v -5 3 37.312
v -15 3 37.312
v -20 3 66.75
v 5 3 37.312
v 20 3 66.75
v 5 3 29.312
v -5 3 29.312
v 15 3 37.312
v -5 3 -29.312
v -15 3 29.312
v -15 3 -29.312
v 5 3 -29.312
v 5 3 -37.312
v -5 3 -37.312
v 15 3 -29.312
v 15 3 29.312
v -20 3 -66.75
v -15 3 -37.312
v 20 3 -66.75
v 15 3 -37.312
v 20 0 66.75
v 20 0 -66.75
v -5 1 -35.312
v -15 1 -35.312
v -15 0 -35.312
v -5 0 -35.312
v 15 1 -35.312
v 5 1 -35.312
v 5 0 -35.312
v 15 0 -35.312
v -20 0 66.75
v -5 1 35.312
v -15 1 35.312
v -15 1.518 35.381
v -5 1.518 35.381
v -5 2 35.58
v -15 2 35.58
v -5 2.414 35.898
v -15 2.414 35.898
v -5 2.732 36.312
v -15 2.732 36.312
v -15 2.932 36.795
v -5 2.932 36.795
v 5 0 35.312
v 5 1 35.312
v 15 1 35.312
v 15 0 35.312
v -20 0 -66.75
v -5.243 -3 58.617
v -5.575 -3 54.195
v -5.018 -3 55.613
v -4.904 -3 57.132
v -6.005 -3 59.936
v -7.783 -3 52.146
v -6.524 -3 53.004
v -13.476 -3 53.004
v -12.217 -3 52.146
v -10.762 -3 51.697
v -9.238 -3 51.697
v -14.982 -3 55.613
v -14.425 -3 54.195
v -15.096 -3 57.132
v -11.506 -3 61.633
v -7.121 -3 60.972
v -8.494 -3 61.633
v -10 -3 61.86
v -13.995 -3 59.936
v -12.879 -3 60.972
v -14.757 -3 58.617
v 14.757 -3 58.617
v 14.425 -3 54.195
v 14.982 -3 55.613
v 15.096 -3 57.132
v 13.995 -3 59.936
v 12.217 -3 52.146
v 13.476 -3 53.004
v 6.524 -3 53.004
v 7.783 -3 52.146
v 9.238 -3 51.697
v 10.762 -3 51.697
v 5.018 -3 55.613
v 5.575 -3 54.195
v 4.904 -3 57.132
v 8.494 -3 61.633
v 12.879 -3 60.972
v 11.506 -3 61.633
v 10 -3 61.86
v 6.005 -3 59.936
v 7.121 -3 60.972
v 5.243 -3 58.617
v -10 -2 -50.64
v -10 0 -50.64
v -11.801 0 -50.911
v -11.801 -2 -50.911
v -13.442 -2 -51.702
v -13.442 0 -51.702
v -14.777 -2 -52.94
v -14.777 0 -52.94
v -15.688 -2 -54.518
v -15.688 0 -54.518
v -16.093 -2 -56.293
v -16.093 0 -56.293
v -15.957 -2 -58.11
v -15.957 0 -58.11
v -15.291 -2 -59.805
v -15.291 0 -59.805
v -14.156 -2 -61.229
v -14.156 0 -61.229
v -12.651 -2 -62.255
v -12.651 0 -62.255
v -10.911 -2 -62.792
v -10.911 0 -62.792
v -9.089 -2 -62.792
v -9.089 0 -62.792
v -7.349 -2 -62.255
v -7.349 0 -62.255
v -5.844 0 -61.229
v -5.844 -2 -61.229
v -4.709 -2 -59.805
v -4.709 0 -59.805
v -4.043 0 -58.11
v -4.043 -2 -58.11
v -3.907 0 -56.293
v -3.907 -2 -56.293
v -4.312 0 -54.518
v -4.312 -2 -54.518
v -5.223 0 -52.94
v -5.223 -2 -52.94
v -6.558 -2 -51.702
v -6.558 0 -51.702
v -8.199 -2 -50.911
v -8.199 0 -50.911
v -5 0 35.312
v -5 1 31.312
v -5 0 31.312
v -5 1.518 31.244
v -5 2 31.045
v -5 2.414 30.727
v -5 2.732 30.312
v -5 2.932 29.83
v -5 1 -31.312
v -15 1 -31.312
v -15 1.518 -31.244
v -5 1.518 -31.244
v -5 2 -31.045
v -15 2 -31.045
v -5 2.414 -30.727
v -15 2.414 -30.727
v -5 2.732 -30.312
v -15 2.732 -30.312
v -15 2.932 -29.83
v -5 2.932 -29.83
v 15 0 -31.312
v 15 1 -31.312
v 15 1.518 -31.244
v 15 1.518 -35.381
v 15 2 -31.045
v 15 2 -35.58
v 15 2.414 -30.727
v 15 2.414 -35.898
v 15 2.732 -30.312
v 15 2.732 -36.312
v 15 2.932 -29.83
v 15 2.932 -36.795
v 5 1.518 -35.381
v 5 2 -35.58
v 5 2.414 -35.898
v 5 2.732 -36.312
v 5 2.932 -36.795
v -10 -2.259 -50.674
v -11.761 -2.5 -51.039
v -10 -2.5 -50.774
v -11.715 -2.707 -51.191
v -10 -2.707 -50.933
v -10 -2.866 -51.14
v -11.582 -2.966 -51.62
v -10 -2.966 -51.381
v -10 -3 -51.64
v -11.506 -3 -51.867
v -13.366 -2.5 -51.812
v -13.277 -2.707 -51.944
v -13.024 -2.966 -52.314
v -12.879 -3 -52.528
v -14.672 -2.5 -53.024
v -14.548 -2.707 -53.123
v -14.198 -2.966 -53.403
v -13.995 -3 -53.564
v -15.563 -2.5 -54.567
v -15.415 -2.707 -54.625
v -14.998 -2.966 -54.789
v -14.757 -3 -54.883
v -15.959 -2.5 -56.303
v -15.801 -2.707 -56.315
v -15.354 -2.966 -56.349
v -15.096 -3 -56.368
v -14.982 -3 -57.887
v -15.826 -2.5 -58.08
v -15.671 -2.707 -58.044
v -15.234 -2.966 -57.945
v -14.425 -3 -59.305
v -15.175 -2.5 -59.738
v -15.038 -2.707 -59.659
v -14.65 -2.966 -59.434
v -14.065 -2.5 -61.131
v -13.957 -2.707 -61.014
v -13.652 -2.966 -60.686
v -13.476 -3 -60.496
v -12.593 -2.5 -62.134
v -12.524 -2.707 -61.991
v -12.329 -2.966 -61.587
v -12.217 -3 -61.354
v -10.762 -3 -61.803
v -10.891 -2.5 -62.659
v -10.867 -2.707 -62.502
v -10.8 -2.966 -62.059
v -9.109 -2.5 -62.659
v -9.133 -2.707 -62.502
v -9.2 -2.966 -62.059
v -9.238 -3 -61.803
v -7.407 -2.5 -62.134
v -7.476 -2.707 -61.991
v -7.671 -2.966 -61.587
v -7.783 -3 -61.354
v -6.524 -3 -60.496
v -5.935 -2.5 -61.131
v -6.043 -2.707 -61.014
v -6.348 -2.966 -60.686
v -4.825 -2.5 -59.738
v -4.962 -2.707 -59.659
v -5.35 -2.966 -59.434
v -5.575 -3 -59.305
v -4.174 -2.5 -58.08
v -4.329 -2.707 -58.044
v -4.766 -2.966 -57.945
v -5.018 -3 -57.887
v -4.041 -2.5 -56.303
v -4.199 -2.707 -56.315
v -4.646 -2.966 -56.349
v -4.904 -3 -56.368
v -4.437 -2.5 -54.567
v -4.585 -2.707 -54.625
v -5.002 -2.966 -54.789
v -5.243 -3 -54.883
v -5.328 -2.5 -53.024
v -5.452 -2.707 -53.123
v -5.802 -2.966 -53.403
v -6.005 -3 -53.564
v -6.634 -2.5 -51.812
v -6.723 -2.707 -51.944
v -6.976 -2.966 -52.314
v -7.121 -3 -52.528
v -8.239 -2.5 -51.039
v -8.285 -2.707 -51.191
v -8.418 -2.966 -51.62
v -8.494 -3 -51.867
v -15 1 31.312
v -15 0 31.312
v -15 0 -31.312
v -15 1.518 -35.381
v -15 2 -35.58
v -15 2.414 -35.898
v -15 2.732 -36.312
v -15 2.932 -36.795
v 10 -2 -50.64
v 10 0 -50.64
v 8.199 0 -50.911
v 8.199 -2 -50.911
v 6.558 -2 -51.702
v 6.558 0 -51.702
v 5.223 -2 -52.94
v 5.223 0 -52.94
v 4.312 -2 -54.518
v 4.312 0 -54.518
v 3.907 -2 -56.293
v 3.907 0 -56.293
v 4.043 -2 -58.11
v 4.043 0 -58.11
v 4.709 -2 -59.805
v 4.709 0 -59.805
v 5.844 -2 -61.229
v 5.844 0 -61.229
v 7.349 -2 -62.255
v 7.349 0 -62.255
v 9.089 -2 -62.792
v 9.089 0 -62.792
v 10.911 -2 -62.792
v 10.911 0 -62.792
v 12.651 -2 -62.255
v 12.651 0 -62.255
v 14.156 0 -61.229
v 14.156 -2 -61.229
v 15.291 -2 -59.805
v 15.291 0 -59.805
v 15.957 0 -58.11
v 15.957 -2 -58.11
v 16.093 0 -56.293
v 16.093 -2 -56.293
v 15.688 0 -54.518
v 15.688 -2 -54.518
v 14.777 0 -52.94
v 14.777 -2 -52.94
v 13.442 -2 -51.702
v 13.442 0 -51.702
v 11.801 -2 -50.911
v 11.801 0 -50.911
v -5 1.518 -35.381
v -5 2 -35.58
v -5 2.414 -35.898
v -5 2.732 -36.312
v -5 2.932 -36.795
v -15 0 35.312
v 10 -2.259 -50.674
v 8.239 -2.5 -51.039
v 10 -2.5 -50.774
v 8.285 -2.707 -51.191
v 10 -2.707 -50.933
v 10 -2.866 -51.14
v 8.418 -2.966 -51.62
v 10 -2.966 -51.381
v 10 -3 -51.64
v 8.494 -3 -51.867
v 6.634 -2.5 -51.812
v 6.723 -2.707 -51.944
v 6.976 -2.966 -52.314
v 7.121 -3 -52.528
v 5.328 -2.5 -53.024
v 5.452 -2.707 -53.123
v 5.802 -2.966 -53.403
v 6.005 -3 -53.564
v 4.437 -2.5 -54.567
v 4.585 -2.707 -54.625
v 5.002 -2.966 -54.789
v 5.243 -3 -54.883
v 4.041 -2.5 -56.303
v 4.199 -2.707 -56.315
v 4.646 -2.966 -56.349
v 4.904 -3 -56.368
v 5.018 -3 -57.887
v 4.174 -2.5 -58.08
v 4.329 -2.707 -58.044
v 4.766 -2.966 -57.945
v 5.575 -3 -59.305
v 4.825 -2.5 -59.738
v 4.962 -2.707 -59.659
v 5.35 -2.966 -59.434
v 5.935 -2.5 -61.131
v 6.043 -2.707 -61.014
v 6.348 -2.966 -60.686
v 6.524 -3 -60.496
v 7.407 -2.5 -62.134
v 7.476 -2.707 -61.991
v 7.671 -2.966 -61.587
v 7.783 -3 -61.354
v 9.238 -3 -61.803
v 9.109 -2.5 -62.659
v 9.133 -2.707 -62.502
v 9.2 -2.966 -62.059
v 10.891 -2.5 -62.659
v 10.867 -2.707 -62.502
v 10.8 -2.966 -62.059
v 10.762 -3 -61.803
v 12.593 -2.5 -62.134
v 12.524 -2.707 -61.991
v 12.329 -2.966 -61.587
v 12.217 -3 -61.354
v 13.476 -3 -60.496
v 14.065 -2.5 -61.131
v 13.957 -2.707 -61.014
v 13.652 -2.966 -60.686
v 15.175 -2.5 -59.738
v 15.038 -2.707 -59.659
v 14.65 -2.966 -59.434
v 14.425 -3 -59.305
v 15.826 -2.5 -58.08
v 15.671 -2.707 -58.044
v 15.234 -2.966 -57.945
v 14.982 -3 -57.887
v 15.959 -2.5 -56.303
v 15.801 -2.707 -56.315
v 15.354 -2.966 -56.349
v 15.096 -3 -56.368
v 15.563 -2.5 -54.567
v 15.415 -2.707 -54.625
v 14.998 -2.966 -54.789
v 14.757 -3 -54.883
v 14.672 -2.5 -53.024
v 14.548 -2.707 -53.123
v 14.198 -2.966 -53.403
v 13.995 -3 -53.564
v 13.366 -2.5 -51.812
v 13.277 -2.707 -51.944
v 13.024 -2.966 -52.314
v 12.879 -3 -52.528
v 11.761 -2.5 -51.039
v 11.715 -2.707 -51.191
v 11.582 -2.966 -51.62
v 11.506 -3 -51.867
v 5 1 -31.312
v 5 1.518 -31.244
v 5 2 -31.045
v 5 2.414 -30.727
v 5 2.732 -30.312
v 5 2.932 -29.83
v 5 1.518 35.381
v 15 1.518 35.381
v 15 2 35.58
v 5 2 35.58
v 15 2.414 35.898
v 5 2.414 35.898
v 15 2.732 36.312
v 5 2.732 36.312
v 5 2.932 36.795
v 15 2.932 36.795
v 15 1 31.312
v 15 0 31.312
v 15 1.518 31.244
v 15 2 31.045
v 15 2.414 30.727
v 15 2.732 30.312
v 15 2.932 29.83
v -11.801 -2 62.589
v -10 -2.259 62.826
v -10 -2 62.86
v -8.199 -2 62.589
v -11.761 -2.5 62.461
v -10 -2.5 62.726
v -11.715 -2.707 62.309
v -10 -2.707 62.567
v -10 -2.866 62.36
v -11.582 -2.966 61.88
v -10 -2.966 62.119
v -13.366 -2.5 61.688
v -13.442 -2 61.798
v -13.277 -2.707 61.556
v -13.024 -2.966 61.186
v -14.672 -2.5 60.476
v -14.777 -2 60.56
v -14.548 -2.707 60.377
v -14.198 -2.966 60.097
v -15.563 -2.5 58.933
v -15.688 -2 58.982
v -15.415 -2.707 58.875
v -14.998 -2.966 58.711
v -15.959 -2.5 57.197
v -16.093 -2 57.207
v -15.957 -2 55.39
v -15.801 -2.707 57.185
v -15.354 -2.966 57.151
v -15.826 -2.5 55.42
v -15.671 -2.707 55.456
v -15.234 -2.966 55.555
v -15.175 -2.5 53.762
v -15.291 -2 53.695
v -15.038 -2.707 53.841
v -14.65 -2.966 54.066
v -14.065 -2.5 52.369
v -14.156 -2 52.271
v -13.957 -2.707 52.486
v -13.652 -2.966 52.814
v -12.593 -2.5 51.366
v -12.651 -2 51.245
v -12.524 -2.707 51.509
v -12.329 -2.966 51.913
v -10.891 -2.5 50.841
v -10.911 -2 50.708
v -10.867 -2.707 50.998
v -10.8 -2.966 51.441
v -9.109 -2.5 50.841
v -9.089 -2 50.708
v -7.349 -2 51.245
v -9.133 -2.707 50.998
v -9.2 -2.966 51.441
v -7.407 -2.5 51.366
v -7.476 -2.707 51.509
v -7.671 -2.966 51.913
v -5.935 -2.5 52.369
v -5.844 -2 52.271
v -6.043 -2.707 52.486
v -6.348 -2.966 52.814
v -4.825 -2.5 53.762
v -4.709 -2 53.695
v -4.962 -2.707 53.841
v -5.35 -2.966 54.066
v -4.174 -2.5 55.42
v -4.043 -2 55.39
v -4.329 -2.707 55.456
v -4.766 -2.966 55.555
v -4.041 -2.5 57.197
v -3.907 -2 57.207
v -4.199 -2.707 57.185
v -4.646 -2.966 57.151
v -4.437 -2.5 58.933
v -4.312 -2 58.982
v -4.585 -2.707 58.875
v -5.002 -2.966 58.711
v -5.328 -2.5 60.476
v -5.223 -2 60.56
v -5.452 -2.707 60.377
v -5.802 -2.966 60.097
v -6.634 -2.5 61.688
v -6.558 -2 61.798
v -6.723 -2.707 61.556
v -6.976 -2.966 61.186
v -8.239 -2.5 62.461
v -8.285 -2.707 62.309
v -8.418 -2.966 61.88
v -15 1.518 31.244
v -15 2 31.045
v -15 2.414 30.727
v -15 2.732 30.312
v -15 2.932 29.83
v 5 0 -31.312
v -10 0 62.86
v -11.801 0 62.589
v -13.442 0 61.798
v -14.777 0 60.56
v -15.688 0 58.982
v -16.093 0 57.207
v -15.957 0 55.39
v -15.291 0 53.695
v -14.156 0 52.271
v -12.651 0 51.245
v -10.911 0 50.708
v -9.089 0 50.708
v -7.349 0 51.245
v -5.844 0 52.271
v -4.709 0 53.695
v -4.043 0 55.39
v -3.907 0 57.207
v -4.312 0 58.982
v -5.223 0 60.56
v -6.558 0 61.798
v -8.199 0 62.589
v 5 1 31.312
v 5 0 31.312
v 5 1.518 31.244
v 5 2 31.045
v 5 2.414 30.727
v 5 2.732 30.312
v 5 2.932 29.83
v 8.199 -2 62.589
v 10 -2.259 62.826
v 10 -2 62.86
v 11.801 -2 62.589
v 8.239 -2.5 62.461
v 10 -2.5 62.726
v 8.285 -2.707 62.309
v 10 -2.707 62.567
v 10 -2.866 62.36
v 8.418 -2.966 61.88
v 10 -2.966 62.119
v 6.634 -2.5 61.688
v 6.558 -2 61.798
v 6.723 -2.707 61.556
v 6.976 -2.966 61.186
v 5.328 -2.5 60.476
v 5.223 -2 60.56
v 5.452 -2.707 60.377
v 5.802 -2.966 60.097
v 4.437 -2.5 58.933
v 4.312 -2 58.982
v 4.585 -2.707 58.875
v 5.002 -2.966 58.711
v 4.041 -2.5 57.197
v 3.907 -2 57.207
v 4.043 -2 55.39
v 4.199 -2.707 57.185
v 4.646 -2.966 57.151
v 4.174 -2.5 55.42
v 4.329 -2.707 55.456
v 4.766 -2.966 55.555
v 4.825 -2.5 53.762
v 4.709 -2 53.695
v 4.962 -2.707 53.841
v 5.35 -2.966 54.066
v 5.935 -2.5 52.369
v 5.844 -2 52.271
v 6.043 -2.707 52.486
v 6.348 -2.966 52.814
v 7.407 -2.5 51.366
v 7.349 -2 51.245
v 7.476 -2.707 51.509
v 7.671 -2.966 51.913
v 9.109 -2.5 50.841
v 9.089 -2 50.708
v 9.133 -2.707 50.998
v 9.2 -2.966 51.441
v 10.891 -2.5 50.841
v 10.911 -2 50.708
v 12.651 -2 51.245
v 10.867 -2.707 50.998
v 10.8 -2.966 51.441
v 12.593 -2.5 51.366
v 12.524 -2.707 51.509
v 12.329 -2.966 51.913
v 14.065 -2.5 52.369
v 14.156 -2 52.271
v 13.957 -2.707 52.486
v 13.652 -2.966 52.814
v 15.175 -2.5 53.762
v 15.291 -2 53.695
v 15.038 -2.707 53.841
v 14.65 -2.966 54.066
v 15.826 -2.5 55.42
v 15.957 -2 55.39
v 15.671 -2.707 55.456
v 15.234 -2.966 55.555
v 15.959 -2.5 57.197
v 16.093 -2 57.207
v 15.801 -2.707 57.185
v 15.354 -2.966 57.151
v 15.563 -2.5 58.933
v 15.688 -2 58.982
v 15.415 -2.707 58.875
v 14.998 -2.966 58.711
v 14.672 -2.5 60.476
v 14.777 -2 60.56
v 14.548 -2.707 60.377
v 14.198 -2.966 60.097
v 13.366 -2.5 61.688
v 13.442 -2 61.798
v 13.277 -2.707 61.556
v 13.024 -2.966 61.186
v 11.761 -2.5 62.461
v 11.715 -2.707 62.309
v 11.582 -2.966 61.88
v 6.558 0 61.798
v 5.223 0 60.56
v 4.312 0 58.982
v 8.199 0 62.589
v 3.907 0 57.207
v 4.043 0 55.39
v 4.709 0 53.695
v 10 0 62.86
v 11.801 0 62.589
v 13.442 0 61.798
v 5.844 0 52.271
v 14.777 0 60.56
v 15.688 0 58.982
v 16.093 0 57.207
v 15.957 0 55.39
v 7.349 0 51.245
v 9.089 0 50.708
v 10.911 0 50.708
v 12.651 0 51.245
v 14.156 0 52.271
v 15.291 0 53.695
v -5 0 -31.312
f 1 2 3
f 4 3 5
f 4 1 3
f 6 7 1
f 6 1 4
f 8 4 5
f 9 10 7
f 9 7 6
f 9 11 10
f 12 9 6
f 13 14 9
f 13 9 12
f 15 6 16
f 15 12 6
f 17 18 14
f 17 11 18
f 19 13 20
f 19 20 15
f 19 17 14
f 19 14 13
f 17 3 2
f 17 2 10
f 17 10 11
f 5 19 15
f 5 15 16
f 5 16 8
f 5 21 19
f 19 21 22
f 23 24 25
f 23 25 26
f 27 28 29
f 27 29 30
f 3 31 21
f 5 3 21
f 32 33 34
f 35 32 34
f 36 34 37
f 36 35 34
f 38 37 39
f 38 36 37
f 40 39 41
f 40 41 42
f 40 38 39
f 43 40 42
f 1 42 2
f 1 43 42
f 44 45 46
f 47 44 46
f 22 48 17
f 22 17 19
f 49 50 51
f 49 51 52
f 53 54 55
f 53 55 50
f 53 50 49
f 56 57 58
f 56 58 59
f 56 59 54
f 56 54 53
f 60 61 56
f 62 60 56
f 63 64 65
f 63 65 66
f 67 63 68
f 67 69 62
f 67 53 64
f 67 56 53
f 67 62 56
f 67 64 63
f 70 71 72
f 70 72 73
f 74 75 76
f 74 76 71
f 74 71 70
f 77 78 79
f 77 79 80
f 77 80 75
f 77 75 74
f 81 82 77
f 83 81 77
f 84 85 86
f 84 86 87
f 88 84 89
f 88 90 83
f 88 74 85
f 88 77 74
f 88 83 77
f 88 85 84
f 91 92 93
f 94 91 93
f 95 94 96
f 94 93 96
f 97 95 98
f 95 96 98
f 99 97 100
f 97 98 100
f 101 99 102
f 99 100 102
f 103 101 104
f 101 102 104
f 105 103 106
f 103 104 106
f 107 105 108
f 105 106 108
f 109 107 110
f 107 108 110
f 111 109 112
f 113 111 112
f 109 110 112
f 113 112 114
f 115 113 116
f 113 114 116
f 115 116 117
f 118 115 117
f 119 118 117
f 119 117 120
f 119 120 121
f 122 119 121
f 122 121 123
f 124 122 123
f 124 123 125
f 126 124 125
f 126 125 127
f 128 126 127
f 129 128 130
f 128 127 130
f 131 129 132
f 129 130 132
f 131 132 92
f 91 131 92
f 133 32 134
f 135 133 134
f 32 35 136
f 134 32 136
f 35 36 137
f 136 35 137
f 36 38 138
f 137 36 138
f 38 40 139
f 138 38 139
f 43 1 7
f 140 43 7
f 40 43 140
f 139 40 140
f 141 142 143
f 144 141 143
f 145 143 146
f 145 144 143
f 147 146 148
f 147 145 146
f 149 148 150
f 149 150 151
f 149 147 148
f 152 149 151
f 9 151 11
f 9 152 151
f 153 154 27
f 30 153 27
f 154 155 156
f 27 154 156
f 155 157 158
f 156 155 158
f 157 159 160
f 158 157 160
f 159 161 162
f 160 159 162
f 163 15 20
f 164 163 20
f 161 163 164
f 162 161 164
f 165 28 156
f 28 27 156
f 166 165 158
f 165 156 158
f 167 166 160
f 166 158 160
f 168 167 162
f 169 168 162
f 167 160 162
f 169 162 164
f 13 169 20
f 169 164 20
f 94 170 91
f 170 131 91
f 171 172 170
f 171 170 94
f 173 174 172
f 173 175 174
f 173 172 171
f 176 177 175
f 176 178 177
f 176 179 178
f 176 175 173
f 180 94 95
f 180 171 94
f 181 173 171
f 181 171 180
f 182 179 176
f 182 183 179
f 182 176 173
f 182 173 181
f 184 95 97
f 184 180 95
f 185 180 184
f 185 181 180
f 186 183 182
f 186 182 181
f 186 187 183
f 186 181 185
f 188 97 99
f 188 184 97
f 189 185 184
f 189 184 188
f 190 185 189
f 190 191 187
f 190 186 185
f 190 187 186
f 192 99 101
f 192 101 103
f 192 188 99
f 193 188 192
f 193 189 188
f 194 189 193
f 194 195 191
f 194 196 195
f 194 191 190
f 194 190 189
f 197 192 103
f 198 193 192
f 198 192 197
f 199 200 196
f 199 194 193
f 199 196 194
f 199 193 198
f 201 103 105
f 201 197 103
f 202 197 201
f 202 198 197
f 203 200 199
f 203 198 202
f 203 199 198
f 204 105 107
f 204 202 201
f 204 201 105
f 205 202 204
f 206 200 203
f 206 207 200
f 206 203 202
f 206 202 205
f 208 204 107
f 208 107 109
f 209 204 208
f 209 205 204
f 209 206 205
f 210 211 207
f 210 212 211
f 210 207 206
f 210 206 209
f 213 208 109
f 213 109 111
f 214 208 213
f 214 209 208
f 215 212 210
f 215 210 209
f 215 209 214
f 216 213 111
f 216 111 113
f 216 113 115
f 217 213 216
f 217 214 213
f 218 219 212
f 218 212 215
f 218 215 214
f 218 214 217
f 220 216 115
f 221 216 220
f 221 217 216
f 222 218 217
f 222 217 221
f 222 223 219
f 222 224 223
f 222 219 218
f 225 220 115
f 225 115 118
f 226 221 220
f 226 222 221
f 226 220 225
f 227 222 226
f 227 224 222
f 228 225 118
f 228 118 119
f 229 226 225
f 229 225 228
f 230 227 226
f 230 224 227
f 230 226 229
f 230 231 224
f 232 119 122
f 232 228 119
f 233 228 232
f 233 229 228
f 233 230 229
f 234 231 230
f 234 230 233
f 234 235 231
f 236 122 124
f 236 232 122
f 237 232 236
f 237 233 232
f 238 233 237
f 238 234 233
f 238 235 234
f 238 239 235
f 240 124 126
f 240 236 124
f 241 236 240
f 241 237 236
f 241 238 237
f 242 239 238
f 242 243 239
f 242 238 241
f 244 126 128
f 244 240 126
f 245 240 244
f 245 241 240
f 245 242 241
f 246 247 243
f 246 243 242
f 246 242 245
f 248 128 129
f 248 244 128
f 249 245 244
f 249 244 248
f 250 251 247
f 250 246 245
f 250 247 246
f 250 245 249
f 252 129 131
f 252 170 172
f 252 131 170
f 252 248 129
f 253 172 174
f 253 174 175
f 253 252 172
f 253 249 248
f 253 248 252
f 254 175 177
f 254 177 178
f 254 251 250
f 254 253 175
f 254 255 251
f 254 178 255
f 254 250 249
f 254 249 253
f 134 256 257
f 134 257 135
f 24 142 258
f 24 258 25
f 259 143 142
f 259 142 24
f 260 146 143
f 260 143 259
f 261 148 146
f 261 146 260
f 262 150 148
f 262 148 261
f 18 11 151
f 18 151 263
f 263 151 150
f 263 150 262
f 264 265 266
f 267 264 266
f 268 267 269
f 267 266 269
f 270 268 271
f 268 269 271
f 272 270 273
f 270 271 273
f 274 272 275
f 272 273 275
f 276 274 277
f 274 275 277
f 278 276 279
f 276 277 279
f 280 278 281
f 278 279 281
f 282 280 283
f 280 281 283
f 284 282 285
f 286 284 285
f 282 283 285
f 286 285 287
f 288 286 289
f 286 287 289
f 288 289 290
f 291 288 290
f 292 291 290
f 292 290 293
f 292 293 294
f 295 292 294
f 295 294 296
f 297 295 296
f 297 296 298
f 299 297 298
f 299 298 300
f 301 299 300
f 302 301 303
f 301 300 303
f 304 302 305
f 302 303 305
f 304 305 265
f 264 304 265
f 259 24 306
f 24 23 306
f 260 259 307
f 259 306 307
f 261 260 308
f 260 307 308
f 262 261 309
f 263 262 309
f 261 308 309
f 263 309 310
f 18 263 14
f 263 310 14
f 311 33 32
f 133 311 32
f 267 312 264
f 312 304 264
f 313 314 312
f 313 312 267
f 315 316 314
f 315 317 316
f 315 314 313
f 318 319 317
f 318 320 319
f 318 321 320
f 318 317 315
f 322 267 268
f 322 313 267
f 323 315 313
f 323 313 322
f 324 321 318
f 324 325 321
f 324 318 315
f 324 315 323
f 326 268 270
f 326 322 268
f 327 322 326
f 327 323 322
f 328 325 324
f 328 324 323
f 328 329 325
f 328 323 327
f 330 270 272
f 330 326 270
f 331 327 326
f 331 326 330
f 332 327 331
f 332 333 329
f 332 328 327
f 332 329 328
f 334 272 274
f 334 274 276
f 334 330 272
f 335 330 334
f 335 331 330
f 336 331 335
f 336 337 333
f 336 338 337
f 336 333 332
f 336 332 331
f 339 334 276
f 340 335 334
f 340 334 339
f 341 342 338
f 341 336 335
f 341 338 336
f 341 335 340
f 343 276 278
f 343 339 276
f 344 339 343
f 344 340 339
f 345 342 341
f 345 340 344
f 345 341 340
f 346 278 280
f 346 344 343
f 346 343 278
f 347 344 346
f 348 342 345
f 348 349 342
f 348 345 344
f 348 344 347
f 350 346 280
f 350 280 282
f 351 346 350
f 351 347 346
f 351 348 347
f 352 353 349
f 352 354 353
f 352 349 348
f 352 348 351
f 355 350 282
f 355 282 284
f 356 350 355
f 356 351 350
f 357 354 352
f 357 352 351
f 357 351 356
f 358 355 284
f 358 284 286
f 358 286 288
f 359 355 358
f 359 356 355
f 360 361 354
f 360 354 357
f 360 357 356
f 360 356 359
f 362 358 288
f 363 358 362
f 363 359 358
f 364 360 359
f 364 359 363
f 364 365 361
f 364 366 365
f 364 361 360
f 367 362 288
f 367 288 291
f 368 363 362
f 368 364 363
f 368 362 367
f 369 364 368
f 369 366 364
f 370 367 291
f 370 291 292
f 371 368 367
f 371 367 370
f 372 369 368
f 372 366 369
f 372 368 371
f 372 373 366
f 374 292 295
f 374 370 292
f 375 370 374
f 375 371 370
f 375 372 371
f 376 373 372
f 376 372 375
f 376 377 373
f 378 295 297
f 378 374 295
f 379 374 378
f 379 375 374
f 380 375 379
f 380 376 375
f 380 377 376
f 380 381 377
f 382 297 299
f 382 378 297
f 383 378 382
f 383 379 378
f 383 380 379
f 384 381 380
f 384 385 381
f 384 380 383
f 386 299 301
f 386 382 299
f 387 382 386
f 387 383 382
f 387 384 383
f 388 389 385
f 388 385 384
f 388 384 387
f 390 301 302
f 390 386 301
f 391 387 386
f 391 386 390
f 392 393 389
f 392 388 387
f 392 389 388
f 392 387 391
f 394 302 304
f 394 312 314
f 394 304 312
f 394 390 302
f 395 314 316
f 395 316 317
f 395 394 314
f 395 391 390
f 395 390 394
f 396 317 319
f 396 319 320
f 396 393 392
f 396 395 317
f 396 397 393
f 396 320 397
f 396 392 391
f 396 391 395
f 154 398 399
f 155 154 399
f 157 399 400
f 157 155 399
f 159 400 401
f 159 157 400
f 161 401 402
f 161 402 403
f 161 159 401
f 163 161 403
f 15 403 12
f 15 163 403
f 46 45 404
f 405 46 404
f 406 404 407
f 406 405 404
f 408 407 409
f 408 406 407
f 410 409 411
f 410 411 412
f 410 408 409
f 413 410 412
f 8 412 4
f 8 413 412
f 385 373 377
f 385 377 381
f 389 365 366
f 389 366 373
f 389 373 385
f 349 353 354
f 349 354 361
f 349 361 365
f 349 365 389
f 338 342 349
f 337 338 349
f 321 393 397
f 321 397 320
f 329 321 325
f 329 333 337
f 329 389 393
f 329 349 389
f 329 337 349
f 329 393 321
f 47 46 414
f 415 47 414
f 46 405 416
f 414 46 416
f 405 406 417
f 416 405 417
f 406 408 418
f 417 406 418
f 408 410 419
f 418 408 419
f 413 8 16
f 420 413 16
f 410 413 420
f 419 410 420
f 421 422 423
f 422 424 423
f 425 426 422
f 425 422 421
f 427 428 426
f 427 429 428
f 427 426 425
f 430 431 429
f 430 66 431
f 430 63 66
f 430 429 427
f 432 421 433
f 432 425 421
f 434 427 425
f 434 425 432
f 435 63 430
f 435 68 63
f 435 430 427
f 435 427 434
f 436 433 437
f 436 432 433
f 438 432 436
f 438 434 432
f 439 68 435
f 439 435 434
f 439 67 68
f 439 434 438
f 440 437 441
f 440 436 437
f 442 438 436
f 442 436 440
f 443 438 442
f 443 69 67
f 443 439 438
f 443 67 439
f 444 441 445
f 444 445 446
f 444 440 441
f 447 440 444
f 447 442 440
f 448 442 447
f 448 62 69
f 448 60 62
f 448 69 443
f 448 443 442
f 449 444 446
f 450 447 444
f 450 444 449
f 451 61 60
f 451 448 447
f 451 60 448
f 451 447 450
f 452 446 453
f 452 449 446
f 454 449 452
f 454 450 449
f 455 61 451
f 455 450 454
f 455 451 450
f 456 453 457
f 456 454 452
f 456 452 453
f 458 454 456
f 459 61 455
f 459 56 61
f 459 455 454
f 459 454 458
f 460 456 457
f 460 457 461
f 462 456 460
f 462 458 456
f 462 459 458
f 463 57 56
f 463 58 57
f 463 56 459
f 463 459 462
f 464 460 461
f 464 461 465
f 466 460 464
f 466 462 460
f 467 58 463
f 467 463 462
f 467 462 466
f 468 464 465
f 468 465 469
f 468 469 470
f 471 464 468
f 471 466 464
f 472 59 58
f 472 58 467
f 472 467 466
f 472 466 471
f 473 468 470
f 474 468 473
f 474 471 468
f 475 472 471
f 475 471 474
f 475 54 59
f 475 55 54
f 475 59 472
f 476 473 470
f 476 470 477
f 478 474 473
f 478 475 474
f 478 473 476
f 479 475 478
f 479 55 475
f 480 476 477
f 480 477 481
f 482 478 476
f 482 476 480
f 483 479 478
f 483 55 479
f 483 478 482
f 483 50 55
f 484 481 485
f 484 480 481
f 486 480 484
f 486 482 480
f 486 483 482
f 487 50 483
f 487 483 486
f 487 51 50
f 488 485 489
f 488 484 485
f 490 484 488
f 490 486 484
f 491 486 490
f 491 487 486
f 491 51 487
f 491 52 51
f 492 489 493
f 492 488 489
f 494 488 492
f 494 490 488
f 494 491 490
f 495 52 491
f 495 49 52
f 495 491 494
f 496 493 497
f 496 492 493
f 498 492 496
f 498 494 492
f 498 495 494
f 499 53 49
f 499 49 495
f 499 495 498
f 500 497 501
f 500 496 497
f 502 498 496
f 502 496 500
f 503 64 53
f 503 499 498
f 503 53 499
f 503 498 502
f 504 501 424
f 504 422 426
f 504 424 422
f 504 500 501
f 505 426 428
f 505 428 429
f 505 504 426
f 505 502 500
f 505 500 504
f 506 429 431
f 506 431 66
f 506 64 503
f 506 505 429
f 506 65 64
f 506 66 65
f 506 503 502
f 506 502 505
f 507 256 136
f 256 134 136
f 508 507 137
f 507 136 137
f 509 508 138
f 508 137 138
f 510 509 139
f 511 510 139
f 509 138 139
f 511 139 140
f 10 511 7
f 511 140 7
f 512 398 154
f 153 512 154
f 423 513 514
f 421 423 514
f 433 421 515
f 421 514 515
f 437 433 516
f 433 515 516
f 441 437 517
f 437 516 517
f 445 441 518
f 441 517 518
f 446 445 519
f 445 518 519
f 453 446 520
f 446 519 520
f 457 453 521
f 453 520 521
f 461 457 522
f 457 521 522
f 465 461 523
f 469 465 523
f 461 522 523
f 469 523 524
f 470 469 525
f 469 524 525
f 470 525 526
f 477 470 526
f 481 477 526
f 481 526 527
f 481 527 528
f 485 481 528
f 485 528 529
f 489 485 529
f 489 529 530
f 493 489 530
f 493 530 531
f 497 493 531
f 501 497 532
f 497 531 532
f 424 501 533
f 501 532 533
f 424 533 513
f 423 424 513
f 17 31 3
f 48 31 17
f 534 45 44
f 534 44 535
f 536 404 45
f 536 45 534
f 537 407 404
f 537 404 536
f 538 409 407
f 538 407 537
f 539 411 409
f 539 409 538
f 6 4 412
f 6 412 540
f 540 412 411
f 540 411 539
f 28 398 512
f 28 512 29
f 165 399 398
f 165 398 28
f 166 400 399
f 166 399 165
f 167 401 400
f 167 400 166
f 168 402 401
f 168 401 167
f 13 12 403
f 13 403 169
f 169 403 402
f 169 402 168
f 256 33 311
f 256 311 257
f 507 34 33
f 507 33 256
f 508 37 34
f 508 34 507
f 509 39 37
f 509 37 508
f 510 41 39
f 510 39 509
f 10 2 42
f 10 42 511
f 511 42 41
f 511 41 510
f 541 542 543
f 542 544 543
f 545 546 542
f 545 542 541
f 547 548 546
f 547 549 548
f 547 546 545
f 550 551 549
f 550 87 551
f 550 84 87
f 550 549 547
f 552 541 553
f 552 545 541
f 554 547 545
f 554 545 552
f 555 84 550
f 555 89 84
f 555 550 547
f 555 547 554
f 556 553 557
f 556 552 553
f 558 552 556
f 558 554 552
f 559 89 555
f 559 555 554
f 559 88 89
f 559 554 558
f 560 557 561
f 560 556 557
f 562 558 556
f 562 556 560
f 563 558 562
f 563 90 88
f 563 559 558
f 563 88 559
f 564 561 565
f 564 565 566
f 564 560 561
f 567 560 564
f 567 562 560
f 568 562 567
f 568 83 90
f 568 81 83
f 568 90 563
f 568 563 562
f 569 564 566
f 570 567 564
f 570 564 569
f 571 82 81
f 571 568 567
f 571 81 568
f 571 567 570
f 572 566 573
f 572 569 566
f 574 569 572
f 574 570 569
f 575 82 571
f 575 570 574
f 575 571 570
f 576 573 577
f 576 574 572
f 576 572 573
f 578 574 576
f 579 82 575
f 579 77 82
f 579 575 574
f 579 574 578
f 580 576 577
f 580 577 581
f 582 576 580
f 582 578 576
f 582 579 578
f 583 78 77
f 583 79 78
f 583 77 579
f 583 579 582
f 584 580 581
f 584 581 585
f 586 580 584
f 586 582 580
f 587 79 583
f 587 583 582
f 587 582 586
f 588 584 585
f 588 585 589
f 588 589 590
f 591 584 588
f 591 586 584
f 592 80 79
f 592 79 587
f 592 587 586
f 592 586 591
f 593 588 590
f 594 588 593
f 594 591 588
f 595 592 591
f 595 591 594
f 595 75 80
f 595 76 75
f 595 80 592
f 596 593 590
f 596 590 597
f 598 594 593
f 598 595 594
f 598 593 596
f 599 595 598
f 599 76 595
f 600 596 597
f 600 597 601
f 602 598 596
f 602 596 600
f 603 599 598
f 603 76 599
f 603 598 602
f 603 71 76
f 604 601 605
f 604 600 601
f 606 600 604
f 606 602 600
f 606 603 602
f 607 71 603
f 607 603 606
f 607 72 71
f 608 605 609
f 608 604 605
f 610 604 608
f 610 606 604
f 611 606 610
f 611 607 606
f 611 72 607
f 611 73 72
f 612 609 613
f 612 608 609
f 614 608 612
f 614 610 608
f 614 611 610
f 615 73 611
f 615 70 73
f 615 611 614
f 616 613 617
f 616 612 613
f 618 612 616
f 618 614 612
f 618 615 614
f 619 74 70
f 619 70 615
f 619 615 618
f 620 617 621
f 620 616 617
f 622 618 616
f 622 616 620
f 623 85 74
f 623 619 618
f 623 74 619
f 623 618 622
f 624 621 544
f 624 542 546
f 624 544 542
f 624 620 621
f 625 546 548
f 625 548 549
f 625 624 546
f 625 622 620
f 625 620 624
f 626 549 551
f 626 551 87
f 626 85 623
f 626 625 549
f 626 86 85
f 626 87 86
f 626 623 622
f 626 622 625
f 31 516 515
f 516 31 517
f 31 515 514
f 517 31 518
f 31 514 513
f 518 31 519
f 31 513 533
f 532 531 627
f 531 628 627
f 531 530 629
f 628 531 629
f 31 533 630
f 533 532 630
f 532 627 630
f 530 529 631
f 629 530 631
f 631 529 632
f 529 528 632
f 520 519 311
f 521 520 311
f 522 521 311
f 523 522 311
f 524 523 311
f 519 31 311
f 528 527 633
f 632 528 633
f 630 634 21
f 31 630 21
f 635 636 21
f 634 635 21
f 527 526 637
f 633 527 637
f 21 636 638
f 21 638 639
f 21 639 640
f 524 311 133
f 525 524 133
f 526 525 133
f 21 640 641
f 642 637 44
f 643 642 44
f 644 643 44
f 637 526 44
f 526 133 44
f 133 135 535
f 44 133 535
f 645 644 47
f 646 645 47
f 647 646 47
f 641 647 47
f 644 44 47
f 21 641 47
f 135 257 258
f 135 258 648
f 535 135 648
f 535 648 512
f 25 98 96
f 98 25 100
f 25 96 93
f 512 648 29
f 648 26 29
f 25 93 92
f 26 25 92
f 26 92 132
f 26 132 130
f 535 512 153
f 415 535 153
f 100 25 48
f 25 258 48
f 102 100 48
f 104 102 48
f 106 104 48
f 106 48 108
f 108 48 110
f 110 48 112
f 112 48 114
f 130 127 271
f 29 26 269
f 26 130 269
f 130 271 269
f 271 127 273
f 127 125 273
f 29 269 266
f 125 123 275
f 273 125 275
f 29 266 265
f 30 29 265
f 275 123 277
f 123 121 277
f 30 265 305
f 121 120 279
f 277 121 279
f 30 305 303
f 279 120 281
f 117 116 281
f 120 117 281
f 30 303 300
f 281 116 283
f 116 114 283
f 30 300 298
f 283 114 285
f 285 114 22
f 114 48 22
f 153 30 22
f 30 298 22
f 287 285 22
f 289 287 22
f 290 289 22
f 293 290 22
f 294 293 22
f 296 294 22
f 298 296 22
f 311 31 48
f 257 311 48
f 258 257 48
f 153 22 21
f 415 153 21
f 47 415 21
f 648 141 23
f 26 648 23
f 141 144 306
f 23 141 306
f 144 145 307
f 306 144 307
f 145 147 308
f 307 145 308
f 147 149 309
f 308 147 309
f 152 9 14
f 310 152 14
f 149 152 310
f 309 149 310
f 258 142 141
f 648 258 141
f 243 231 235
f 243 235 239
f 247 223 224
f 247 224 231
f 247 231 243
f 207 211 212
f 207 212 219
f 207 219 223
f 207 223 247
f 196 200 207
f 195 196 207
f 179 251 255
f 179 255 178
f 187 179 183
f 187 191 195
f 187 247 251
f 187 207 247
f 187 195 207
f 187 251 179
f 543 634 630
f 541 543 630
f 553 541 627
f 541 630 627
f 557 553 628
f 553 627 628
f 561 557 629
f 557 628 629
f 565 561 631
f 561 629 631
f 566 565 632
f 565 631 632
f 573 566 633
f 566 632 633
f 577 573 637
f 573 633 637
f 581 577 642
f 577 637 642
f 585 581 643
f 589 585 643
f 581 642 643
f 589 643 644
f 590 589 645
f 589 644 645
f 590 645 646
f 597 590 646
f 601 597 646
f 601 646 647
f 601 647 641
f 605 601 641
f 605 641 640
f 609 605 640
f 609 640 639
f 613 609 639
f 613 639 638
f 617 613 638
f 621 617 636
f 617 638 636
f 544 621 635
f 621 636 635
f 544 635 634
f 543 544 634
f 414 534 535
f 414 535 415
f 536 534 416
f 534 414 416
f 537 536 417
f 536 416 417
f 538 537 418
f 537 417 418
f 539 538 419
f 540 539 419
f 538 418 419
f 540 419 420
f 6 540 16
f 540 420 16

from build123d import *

# Parameters (mm, degrees)
SKETCH1_W           = 40
SKETCH1_H           = 133.5
BOSS_EXTRUDE1_DEPTH = 3
SKETCH2_R           = 6.11
BOSS_EXTRUDE2_DEPTH = 3
CUT_EXTRUDE1_REACH  = 71.94
SKETCH3_W           = 10
SKETCH3_H           = 4
FILLET3_R           = 1
FILLET4_R           = 2


with BuildPart() as part:
    # Sketch1 → Boss-Extrude1 (new body)
    with BuildSketch(Plane(origin=(0, 0, 0), x_dir=(1, 0, 0), z_dir=(0, 1, 0))):
        Rectangle(SKETCH1_W, SKETCH1_H)
    extrude(amount=BOSS_EXTRUDE1_DEPTH)

    # Sketch2 → Boss-Extrude2 (add)
    with BuildSketch(Plane.XZ):
        with Locations(Location((10, 56.75, 0), (0, 0, 90))):
            Circle(SKETCH2_R)
        with Locations(Location((-10, 56.75, 0), (0, 0, 90))):
            Circle(SKETCH2_R)
        with Locations(Location((-10, -56.75, 0), (0, 0, 90))):
            Circle(SKETCH2_R)
        with Locations(Location((10, -56.75, 0), (0, 0, 90))):
            Circle(SKETCH2_R)
    extrude(amount=BOSS_EXTRUDE2_DEPTH)

    # Sketch3 → Cut-Extrude1 (cut, up to next)
    with BuildSketch(Plane(origin=(0, 3, 0), x_dir=(1, 0, 0), z_dir=(0, 1, 0)), mode=Mode.PRIVATE) as cut_extrude1_sk1:
        with Locations((10, 33.3125)):
            Rectangle(SKETCH3_W, SKETCH3_H)
    cut_extrude1_tool1 = extrude(cut_extrude1_sk1.sketch, amount=-CUT_EXTRUDE1_REACH, mode=Mode.PRIVATE) & part.part
    # Sketch3 → Cut-Extrude1 (cut, up to next)
    with BuildSketch(Plane(origin=(0, 3, 0), x_dir=(1, 0, 0), z_dir=(0, 1, 0)), mode=Mode.PRIVATE) as cut_extrude1_sk2:
        with Locations((-10, 33.3125)):
            Rectangle(SKETCH3_W, SKETCH3_H)
    cut_extrude1_tool2 = extrude(cut_extrude1_sk2.sketch, amount=-CUT_EXTRUDE1_REACH, mode=Mode.PRIVATE) & part.part
    # Sketch3 → Cut-Extrude1 (cut, up to next)
    with BuildSketch(Plane(origin=(0, 3, 0), x_dir=(1, 0, 0), z_dir=(0, 1, 0)), mode=Mode.PRIVATE) as cut_extrude1_sk3:
        with Locations((-10, -33.3125)):
            Rectangle(SKETCH3_W, SKETCH3_H)
    cut_extrude1_tool3 = extrude(cut_extrude1_sk3.sketch, amount=-CUT_EXTRUDE1_REACH, mode=Mode.PRIVATE) & part.part
    # Sketch3 → Cut-Extrude1 (cut, up to next)
    with BuildSketch(Plane(origin=(0, 3, 0), x_dir=(1, 0, 0), z_dir=(0, 1, 0)), mode=Mode.PRIVATE) as cut_extrude1_sk4:
        with Locations((10, -33.3125)):
            Rectangle(SKETCH3_W, SKETCH3_H)
    cut_extrude1_tool4 = extrude(cut_extrude1_sk4.sketch, amount=-CUT_EXTRUDE1_REACH, mode=Mode.PRIVATE) & part.part
    add(cut_extrude1_tool1.solids().sort_by_distance((10, 3, -33.3125))[0], mode=Mode.SUBTRACT)
    add(cut_extrude1_tool2.solids().sort_by_distance((-10, 3, -33.3125))[0], mode=Mode.SUBTRACT)
    add(cut_extrude1_tool3.solids().sort_by_distance((-10, 3, 33.3125))[0], mode=Mode.SUBTRACT)
    add(cut_extrude1_tool4.solids().sort_by_distance((10, 3, 33.3125))[0], mode=Mode.SUBTRACT)

    # Fillet3
    fillet3_edges = [part.edges().sort_by_distance(p)[0] for p in [
        (10, -3, -62.86),
        (-10, -3, -62.86),
        (-10, -3, 50.64),
        (10, -3, 50.64),
    ]]
    fillet(fillet3_edges, radius=FILLET3_R)

    # Fillet4
    fillet4_edges = [part.edges().sort_by_distance(p)[0] for p in [
        (10, 3, 35.3125),
        (10, 3, 31.3125),
        (-10, 3, 35.3125),
        (-10, 3, 31.3125),
        (-10, 3, -35.3125),
        (-10, 3, -31.3125),
        (10, 3, -35.3125),
        (10, 3, -31.3125),
    ]]
    fillet(fillet4_edges, radius=FILLET4_R)


solid = part.part
